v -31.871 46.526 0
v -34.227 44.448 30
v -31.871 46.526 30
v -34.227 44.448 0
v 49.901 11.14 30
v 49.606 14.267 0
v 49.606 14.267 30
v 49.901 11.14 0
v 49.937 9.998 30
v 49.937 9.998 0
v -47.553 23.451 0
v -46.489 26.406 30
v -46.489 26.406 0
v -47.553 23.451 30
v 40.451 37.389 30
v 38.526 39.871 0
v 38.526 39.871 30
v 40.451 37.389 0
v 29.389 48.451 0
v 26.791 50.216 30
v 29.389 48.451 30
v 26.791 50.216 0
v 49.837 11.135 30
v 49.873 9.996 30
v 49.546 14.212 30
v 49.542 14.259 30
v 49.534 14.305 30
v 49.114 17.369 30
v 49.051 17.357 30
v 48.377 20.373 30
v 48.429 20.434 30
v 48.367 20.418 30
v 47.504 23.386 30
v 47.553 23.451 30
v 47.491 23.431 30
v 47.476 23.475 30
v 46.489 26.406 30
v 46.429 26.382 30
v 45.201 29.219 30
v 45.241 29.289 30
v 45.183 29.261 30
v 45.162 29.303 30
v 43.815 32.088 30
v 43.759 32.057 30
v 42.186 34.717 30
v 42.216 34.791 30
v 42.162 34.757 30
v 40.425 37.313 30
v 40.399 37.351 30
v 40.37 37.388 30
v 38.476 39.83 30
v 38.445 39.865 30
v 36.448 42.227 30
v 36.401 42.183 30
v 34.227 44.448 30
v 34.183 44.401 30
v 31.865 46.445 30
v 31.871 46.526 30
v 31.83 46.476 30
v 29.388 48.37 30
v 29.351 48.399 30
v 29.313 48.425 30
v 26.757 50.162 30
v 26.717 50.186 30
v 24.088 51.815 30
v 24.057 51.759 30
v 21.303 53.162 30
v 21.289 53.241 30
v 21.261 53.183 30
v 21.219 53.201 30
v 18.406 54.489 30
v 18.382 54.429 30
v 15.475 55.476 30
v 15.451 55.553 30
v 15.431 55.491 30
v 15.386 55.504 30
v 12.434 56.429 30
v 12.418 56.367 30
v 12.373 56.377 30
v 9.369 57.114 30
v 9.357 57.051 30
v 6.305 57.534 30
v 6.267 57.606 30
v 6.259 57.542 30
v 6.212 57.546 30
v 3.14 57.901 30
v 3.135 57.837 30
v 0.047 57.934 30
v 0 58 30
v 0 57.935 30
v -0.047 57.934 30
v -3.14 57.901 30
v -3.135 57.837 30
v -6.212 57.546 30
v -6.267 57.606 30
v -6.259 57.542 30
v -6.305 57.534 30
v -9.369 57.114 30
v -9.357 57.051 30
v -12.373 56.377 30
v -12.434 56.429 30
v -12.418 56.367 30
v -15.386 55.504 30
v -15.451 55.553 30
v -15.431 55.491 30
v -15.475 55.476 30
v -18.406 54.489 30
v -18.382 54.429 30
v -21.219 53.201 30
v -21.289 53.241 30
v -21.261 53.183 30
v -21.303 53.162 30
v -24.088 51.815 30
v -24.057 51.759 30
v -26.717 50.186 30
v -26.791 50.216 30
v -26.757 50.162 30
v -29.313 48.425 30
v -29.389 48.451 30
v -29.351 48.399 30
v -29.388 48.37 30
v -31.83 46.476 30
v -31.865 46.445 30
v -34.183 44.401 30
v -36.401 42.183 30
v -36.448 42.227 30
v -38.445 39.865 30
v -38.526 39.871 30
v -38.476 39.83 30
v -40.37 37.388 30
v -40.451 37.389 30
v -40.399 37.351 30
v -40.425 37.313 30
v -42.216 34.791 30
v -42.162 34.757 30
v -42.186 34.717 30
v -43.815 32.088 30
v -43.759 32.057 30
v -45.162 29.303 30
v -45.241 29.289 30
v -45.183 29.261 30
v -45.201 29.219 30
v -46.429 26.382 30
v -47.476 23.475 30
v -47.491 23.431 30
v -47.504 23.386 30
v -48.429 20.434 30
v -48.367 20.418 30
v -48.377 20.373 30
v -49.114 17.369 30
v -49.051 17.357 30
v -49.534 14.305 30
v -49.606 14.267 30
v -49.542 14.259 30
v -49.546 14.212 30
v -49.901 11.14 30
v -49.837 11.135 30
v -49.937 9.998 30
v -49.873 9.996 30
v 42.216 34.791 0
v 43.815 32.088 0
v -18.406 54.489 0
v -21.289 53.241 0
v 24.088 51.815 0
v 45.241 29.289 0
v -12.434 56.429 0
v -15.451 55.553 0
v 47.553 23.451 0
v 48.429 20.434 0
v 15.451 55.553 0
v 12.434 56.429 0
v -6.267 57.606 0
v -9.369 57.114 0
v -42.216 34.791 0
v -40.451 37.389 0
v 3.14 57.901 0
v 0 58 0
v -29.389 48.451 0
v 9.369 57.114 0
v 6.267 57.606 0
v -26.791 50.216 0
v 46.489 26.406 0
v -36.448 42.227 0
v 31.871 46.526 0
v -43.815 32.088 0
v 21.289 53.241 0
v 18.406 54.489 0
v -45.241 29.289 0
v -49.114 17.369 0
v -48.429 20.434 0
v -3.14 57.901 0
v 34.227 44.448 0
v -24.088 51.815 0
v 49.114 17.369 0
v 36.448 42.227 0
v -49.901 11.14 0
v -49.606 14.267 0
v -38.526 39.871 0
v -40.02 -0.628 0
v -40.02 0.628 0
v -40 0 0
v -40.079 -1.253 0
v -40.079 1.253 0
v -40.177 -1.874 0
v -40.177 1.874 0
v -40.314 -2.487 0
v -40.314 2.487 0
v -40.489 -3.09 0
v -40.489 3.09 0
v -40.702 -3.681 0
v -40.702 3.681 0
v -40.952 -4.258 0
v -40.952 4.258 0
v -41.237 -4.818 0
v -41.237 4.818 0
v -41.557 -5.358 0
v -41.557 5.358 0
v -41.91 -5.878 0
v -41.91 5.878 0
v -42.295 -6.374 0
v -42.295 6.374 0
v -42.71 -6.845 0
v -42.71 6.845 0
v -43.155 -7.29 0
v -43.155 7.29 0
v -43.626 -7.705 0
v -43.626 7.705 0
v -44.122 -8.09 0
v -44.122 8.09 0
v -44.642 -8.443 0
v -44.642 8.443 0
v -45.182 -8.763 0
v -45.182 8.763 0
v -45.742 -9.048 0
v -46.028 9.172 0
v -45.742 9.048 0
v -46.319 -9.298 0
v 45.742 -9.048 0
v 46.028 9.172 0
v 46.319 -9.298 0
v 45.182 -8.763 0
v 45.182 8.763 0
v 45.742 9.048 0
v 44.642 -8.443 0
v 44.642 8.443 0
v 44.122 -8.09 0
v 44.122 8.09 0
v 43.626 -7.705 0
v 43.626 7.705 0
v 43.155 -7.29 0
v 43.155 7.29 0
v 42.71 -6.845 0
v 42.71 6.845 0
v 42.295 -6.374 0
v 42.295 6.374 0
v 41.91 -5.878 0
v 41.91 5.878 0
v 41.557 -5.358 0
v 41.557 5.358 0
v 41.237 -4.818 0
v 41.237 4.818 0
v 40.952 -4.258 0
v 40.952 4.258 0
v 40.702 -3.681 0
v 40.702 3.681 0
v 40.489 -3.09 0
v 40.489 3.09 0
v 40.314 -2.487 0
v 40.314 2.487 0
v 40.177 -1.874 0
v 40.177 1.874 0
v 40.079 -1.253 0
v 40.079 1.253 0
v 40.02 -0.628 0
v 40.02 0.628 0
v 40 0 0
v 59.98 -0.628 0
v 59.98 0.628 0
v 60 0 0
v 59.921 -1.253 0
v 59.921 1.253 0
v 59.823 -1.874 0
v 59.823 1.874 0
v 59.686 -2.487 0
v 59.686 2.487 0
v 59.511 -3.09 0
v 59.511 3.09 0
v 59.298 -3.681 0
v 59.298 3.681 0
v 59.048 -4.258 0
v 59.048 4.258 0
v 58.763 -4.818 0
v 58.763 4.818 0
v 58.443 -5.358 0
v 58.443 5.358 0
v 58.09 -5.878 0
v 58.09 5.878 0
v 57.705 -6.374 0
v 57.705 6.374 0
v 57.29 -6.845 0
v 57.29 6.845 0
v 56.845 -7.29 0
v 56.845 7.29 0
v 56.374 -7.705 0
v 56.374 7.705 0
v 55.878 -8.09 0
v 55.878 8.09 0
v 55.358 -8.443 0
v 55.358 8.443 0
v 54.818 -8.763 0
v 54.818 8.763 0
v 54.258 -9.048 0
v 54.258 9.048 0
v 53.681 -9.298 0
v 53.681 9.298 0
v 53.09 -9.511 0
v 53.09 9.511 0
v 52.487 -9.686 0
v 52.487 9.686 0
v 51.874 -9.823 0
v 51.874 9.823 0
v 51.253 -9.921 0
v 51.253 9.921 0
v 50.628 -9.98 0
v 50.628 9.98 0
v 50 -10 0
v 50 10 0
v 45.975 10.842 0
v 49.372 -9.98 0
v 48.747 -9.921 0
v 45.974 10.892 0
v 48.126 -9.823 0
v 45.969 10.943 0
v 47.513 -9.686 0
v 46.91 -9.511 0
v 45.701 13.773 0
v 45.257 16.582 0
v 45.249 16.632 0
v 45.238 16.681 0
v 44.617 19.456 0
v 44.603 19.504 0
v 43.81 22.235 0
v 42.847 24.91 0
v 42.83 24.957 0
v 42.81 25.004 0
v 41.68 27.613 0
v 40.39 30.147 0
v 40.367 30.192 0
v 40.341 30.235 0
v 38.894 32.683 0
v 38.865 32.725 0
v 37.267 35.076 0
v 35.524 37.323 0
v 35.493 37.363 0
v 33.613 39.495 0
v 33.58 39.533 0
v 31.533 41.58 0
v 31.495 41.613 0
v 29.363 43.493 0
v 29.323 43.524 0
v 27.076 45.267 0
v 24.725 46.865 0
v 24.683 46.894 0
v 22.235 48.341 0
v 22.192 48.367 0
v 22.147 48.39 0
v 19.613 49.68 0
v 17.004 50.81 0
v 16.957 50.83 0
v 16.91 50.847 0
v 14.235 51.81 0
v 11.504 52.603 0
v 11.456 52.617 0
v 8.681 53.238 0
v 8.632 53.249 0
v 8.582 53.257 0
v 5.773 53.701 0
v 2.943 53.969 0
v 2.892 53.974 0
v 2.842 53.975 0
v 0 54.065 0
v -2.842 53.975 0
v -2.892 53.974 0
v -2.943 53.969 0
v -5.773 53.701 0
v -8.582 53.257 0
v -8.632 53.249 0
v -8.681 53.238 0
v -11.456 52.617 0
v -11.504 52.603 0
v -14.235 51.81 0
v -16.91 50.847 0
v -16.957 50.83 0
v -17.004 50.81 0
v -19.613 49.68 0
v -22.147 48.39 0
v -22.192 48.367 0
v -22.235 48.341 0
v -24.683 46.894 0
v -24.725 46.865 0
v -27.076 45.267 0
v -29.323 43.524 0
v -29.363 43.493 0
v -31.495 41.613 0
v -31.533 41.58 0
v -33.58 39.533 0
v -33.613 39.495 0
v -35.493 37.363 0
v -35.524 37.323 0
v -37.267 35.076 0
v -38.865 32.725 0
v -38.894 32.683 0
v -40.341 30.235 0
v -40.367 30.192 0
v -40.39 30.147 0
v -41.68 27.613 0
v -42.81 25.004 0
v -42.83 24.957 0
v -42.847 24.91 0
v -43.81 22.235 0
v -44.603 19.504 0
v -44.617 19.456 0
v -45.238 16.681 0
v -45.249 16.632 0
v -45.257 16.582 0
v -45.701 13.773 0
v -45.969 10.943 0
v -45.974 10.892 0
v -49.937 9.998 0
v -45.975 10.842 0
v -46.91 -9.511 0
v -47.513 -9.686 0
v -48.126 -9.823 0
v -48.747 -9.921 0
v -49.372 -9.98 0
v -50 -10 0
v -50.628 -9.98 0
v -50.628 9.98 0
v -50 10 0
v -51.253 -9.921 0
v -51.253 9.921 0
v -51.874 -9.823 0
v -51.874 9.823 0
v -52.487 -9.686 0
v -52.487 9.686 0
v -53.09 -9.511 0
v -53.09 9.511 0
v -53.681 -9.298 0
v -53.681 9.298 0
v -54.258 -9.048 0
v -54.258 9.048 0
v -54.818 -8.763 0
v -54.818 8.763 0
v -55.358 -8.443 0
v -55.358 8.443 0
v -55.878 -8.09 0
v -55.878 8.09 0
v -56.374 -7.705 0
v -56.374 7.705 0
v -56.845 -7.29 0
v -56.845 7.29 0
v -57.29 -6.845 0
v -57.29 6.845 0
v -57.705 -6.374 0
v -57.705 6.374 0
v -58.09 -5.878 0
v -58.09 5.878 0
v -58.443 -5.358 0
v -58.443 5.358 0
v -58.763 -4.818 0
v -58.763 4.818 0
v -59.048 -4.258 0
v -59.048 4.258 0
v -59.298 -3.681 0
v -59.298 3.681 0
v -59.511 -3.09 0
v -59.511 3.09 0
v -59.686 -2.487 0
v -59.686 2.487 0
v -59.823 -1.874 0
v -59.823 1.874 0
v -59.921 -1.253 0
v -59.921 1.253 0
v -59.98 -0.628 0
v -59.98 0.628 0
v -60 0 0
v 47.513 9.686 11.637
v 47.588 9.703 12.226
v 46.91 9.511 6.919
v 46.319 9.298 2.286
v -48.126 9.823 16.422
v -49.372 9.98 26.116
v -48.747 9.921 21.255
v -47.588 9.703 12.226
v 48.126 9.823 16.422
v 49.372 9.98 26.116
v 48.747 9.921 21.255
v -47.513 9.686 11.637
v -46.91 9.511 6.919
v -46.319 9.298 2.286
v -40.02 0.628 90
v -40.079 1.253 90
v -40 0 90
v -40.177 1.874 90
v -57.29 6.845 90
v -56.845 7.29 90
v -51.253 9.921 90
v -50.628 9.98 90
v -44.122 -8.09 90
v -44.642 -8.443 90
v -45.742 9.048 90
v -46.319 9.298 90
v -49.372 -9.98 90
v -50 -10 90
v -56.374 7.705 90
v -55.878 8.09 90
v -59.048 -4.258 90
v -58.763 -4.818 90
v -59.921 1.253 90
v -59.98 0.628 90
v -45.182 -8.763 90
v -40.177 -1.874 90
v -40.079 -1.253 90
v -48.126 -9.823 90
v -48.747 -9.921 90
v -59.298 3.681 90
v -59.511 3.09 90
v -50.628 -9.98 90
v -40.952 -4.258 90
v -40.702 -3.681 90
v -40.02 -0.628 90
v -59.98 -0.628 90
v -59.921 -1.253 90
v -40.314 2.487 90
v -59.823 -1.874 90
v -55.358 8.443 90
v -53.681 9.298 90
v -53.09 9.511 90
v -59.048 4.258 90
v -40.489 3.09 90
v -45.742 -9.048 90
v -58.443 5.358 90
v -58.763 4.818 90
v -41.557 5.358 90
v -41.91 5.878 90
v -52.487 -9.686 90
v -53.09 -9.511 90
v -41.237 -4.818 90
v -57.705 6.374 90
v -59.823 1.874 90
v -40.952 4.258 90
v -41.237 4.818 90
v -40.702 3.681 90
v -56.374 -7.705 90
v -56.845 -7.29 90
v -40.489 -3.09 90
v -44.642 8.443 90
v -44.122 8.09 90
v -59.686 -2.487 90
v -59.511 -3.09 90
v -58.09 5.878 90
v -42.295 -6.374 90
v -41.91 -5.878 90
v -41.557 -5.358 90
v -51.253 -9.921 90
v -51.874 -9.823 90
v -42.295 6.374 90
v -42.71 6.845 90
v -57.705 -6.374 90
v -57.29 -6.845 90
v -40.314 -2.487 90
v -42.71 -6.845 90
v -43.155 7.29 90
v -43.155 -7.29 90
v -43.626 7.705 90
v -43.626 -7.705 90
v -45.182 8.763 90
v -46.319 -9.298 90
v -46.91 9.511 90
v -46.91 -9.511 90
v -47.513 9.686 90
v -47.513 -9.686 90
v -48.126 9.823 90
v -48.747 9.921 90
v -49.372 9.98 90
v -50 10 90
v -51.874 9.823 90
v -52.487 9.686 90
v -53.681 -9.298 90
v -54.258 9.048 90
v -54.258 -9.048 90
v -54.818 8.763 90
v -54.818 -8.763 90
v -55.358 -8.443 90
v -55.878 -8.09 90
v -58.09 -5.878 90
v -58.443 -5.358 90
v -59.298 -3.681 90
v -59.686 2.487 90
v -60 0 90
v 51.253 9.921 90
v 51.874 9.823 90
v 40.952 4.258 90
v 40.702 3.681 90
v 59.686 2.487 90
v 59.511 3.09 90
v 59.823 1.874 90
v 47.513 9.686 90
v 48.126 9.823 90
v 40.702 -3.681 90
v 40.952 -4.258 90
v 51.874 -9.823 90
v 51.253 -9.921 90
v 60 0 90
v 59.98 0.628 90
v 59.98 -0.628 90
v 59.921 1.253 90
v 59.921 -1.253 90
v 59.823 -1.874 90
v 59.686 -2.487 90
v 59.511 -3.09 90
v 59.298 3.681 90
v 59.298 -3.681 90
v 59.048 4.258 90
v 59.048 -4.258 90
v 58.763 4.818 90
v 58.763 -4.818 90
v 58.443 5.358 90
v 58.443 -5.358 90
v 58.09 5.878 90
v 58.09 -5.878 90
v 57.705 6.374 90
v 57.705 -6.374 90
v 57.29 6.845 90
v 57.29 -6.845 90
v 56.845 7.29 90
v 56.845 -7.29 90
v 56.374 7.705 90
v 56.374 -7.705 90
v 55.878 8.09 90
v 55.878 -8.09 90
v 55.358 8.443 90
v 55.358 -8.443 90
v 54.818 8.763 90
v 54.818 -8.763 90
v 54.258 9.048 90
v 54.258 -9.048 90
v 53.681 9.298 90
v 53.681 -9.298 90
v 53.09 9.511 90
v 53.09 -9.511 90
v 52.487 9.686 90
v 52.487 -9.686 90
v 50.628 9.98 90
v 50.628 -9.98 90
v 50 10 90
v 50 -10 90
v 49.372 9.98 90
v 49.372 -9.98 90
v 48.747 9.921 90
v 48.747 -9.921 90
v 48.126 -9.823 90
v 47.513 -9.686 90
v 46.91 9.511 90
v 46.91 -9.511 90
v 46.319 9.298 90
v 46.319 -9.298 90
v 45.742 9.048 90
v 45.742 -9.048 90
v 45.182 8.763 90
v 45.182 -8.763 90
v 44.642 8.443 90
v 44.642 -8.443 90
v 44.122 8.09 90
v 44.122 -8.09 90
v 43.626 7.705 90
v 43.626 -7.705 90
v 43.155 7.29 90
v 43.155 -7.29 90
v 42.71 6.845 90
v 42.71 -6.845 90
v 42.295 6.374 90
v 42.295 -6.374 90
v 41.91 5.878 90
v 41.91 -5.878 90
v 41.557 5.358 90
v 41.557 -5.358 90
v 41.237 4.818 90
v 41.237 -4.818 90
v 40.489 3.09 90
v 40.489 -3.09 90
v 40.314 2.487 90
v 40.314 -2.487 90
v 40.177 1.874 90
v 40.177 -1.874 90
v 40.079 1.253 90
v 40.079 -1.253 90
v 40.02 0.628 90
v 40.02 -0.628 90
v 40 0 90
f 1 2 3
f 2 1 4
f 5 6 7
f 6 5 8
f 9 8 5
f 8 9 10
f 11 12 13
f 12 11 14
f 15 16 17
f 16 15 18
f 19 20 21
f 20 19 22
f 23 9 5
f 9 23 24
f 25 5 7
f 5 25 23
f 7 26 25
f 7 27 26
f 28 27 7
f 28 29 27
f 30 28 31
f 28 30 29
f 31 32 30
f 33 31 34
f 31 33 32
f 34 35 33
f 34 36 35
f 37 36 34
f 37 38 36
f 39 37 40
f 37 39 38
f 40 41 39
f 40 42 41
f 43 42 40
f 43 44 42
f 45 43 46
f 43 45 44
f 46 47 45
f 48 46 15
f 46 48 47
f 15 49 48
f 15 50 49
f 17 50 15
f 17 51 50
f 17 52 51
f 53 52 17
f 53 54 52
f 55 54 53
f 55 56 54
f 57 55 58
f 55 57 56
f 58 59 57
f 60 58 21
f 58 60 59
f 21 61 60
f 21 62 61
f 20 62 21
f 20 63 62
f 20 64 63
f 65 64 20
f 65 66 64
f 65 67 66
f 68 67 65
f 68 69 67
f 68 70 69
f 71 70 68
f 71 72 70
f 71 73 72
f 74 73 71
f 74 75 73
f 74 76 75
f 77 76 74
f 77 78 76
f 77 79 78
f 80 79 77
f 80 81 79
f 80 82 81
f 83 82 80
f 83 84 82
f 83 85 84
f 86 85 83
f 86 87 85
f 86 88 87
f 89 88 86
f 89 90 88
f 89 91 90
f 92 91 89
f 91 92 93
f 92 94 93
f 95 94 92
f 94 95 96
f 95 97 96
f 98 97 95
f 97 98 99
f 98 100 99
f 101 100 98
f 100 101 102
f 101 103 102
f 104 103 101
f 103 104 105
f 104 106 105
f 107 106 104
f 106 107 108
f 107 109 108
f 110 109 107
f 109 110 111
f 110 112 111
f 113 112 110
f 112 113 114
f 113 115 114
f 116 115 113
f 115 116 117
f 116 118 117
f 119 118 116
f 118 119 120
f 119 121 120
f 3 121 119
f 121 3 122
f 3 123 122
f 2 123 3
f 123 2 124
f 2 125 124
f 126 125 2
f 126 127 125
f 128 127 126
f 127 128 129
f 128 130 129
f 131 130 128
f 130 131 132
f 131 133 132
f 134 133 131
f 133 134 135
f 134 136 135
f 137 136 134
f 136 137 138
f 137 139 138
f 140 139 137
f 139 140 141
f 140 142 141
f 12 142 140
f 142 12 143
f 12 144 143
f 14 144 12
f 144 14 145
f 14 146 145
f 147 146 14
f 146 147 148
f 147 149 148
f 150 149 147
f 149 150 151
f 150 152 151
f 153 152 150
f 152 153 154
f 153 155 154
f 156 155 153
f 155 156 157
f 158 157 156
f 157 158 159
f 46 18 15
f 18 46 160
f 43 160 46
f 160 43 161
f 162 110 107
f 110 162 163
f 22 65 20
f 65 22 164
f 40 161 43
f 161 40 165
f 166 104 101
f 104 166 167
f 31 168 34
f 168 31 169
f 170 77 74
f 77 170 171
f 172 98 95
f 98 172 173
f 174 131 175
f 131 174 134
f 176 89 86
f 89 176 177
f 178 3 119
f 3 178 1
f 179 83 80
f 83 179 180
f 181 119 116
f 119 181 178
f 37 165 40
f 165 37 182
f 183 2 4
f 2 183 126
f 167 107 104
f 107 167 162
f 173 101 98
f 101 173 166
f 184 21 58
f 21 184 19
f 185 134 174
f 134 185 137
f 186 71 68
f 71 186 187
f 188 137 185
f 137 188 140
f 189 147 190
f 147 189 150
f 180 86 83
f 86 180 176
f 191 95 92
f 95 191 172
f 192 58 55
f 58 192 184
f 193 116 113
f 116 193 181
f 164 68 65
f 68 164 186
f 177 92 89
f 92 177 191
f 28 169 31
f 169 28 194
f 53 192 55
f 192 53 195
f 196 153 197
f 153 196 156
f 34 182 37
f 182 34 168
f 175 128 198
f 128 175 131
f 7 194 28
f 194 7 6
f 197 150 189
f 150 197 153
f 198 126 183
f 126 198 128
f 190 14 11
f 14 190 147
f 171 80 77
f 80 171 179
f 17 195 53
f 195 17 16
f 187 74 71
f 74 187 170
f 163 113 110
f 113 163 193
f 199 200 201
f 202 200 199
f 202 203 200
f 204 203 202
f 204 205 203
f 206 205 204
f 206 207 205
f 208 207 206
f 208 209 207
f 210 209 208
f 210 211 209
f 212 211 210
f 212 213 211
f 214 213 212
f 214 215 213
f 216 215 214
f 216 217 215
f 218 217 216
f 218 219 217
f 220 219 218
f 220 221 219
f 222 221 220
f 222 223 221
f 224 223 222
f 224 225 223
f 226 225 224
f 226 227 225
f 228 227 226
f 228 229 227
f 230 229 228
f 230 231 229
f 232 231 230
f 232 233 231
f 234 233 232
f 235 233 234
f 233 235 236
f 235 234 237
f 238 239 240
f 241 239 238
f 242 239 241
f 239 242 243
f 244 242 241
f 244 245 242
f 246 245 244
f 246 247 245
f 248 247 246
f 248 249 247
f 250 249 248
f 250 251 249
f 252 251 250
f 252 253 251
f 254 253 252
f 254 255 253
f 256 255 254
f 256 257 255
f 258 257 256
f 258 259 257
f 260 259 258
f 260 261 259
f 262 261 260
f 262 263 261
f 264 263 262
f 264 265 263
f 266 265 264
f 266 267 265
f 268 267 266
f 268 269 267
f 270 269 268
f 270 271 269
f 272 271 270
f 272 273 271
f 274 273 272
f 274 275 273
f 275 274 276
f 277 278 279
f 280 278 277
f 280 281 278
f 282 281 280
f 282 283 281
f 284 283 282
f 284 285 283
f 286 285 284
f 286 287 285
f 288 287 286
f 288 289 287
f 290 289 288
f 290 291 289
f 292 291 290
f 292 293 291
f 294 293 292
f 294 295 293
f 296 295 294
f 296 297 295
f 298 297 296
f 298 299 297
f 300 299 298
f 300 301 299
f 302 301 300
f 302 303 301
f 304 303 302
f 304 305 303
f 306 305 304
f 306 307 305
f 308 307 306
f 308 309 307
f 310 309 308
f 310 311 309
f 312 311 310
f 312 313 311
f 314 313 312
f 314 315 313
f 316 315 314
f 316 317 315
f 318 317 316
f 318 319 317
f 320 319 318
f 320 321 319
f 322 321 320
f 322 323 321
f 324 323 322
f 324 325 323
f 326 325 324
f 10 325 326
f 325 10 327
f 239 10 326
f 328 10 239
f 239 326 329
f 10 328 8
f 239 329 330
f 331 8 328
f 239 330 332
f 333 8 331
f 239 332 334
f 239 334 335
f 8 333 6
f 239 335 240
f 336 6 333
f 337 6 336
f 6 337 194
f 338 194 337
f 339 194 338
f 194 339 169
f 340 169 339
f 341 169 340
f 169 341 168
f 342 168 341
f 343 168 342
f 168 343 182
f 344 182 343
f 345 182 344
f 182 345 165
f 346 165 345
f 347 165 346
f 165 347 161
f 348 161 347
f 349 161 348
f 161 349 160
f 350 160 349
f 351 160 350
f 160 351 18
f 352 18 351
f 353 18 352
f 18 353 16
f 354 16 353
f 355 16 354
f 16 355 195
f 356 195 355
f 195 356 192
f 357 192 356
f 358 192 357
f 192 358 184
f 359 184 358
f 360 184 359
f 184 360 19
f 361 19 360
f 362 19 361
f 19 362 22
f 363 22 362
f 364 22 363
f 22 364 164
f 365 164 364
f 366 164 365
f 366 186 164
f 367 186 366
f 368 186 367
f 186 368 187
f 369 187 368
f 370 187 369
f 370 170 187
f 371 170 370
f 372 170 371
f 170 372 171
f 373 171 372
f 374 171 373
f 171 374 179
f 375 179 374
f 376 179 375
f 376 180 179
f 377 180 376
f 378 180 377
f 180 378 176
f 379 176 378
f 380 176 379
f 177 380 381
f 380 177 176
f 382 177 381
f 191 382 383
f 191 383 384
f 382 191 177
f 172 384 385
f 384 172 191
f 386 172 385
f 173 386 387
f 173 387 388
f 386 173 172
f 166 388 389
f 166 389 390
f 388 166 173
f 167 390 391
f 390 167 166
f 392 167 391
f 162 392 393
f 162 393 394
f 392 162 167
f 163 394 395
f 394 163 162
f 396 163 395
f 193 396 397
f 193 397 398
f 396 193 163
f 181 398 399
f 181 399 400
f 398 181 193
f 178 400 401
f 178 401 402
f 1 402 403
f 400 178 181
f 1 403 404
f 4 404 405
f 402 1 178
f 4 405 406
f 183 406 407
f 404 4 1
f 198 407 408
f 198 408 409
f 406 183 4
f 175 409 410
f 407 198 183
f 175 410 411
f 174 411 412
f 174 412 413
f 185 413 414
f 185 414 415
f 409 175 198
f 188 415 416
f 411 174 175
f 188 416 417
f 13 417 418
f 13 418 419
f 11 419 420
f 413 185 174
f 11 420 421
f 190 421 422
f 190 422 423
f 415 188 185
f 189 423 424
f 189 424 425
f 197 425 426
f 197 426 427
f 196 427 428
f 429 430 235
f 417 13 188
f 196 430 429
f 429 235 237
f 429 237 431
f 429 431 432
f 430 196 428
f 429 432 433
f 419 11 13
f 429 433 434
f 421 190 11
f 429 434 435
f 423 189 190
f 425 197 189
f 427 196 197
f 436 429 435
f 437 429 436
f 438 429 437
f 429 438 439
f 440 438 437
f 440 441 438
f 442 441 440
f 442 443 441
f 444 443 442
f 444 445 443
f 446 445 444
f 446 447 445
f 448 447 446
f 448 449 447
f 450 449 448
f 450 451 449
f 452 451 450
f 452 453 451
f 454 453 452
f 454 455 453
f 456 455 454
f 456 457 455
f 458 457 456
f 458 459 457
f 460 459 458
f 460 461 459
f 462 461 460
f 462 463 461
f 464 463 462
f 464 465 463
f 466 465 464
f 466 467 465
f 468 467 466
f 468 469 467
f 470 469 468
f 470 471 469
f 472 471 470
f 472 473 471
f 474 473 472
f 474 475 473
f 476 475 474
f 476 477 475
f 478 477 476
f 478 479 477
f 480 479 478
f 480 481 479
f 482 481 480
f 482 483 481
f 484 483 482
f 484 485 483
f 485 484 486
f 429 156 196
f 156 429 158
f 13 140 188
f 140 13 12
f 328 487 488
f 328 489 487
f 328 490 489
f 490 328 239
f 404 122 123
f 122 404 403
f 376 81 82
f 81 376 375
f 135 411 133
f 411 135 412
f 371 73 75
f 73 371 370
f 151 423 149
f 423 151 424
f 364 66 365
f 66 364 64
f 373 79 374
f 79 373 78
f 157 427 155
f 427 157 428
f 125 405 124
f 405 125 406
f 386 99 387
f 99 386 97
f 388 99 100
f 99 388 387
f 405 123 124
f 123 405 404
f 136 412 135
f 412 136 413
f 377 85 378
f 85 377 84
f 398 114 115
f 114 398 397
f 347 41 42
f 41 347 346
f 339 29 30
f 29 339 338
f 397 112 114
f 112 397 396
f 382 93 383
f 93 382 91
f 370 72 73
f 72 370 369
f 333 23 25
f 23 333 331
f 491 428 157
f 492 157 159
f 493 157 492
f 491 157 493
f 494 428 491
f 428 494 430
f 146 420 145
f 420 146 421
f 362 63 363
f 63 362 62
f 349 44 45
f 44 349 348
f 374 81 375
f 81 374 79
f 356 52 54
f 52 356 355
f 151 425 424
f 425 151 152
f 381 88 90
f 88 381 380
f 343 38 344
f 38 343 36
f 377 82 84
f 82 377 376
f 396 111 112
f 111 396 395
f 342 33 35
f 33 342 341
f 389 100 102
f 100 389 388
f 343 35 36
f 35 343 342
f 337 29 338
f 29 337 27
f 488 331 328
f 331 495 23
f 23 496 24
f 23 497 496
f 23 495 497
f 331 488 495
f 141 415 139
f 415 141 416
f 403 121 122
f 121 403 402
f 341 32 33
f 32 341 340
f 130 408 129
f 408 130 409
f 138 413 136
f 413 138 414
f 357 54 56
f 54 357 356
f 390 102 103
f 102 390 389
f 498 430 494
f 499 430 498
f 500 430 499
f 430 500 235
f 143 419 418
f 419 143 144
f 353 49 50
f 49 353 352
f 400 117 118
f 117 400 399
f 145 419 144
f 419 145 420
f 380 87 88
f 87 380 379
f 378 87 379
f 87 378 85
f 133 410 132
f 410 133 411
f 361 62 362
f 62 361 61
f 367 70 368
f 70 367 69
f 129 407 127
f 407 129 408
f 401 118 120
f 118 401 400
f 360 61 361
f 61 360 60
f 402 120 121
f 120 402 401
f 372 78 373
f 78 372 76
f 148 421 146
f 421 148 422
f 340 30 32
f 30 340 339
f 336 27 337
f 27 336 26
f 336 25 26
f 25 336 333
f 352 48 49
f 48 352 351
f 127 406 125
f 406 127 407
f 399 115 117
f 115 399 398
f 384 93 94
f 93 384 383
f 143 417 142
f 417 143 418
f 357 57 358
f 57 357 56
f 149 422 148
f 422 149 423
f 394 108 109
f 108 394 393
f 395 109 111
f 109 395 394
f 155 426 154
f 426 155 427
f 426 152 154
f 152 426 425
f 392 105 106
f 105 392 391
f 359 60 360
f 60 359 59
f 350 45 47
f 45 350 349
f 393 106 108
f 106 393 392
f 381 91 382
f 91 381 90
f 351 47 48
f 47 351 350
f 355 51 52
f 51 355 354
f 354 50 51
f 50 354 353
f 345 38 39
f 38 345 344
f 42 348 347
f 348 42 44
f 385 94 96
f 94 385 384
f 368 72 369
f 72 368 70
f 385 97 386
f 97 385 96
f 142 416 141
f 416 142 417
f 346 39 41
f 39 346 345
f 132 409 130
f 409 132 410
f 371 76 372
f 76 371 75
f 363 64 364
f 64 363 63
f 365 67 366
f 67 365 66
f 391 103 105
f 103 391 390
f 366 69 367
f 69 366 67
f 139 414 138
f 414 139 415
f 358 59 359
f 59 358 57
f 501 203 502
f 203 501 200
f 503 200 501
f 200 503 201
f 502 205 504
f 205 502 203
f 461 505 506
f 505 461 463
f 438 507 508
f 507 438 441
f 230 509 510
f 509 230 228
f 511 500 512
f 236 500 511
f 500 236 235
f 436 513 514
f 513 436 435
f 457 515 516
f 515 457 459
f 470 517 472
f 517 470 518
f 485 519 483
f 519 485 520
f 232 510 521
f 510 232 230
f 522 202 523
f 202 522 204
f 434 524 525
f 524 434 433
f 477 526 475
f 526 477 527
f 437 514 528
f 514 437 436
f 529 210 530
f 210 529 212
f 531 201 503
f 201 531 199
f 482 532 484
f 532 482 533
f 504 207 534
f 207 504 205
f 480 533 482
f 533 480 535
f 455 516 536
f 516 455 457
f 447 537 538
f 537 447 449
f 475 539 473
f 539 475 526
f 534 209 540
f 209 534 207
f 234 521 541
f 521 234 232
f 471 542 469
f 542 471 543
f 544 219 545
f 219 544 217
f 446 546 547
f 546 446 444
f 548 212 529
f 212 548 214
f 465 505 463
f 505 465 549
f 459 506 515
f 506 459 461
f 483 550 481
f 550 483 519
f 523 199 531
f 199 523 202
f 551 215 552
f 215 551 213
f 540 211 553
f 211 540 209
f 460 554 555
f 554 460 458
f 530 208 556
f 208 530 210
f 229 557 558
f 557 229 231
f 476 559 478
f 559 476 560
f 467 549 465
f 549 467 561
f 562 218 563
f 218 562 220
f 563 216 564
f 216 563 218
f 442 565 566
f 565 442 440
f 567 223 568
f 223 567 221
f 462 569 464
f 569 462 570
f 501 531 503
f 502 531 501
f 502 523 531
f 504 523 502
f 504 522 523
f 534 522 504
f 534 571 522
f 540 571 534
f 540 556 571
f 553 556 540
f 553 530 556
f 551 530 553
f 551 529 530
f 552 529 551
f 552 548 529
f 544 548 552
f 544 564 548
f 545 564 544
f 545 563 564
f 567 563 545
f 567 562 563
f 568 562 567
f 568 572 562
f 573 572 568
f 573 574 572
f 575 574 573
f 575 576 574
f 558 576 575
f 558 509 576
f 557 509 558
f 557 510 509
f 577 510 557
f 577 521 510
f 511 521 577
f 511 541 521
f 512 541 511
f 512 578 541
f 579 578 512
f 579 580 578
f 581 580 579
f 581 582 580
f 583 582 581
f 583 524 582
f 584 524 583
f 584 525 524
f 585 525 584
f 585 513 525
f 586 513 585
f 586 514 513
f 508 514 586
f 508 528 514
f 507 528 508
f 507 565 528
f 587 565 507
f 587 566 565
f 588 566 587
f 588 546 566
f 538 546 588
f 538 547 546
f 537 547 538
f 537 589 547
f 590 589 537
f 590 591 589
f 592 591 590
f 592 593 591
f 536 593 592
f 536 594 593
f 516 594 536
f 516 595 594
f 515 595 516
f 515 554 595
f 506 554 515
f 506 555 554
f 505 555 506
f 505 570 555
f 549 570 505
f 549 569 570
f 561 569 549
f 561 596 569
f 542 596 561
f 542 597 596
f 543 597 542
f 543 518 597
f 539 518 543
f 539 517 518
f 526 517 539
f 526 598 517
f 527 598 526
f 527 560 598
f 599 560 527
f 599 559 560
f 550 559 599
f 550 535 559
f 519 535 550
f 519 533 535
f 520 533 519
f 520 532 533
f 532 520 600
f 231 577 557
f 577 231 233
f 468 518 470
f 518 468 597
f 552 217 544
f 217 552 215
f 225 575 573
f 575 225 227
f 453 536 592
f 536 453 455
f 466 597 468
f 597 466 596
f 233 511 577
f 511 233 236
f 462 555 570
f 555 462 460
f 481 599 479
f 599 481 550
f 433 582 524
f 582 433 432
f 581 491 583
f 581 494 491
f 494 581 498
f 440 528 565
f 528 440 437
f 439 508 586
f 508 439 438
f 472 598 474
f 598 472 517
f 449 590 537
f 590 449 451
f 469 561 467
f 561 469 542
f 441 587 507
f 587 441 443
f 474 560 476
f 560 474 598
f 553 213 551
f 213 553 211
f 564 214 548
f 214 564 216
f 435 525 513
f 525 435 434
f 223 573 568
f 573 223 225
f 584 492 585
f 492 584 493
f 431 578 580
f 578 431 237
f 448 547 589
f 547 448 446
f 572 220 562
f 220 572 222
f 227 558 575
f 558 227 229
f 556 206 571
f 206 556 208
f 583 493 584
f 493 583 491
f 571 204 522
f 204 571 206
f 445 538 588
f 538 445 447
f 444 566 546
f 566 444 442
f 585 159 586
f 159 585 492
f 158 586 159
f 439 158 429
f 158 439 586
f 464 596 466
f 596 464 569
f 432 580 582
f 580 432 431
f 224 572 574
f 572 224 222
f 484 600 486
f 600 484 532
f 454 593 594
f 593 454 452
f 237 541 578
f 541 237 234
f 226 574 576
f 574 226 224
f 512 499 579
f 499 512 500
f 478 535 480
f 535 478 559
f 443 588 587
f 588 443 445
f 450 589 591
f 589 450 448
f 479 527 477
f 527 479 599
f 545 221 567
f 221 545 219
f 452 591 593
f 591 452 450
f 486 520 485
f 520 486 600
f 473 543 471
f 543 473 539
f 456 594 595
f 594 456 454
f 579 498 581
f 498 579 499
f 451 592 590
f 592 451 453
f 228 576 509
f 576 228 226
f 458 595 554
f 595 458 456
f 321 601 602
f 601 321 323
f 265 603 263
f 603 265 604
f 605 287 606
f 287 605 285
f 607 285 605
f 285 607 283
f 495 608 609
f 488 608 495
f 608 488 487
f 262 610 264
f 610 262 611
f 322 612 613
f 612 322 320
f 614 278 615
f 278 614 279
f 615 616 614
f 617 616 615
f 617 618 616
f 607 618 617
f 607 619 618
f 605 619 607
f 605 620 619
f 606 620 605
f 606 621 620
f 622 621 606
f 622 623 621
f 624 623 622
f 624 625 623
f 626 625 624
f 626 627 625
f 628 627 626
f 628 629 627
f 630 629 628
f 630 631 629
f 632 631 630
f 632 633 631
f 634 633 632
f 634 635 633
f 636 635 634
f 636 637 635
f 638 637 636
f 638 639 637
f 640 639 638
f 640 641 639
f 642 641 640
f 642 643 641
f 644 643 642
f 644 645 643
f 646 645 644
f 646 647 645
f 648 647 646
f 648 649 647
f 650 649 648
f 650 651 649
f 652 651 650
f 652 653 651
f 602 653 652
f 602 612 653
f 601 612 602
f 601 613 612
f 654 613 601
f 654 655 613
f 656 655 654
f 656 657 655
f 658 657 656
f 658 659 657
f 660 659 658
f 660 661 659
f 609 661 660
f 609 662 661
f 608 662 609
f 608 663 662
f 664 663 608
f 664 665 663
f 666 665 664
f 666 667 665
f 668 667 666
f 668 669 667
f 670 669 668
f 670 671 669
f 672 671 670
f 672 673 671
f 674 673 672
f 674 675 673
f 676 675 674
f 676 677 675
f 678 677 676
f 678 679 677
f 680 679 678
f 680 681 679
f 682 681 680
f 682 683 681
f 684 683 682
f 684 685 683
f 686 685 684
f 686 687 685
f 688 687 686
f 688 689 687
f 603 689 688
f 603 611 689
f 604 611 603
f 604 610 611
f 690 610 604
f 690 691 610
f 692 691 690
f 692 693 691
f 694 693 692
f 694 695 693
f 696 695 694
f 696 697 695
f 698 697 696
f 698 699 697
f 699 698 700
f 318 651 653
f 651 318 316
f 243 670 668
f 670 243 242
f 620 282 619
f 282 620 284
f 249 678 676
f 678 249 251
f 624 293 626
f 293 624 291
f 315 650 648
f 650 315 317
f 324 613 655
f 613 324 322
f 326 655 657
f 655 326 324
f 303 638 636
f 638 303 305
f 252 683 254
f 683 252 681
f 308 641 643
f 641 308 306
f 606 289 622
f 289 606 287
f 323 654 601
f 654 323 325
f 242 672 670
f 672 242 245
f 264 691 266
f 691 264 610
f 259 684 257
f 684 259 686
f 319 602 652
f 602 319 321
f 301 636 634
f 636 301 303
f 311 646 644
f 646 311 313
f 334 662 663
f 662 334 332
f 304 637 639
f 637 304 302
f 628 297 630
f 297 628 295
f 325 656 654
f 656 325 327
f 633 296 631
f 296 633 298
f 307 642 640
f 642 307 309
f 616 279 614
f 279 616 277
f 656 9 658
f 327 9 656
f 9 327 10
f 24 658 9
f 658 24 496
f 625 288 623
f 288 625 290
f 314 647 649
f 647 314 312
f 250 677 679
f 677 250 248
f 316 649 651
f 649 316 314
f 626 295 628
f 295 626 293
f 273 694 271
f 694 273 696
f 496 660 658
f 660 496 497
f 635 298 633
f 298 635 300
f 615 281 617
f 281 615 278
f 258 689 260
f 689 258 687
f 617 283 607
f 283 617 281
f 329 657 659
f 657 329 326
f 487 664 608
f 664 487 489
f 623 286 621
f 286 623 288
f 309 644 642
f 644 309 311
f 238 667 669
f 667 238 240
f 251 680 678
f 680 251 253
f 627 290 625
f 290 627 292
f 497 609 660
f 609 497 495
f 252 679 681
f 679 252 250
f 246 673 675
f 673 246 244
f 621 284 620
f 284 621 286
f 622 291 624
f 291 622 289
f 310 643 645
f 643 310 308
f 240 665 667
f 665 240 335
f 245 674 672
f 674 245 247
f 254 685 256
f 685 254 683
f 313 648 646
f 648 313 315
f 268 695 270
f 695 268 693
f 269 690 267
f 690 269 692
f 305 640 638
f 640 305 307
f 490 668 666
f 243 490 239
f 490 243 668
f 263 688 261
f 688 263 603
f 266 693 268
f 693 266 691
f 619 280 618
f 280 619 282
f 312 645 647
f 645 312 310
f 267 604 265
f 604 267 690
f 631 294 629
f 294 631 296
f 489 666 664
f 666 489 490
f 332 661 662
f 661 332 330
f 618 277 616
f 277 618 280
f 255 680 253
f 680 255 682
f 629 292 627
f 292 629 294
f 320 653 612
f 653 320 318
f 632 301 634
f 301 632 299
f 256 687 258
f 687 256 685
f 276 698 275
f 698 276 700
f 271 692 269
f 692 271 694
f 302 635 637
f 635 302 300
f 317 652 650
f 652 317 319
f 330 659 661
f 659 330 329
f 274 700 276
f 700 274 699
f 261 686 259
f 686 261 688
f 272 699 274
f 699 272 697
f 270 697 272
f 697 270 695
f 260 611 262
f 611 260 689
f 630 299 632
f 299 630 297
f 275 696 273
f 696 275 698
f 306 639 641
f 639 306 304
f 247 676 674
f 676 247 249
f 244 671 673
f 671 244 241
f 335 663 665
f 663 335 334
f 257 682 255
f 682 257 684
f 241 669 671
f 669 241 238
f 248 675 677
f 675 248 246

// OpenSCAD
//libre scorp

// radius of handle
r=10;

// length of handles
z=90;

// blade radius
l=50;

// thickness of top of blade
t=4;

// heigth of blade
h=30;

//seperator
s=10;

n=100;

module blade(){
difference(){
cylinder(h = h, r1 = l,r2 = l, center = true, $fn=n);
cylinder(h = h+1, r1 = l-t,r2 = l, center = true, $fn=n);
translate([0,-l/2,0])cube([2*l+1,l+1,h+1], center = true);
}
}

union(){
translate([0,r-2,h/2])blade();
translate([-l,0,z/2])cylinder(h = z, r1 = r,r2 = r, center = true, $fn=n);
translate([l,0,z/2])cylinder(h = z, r1 = r,r2 = r, center = true, $fn=n);
}
